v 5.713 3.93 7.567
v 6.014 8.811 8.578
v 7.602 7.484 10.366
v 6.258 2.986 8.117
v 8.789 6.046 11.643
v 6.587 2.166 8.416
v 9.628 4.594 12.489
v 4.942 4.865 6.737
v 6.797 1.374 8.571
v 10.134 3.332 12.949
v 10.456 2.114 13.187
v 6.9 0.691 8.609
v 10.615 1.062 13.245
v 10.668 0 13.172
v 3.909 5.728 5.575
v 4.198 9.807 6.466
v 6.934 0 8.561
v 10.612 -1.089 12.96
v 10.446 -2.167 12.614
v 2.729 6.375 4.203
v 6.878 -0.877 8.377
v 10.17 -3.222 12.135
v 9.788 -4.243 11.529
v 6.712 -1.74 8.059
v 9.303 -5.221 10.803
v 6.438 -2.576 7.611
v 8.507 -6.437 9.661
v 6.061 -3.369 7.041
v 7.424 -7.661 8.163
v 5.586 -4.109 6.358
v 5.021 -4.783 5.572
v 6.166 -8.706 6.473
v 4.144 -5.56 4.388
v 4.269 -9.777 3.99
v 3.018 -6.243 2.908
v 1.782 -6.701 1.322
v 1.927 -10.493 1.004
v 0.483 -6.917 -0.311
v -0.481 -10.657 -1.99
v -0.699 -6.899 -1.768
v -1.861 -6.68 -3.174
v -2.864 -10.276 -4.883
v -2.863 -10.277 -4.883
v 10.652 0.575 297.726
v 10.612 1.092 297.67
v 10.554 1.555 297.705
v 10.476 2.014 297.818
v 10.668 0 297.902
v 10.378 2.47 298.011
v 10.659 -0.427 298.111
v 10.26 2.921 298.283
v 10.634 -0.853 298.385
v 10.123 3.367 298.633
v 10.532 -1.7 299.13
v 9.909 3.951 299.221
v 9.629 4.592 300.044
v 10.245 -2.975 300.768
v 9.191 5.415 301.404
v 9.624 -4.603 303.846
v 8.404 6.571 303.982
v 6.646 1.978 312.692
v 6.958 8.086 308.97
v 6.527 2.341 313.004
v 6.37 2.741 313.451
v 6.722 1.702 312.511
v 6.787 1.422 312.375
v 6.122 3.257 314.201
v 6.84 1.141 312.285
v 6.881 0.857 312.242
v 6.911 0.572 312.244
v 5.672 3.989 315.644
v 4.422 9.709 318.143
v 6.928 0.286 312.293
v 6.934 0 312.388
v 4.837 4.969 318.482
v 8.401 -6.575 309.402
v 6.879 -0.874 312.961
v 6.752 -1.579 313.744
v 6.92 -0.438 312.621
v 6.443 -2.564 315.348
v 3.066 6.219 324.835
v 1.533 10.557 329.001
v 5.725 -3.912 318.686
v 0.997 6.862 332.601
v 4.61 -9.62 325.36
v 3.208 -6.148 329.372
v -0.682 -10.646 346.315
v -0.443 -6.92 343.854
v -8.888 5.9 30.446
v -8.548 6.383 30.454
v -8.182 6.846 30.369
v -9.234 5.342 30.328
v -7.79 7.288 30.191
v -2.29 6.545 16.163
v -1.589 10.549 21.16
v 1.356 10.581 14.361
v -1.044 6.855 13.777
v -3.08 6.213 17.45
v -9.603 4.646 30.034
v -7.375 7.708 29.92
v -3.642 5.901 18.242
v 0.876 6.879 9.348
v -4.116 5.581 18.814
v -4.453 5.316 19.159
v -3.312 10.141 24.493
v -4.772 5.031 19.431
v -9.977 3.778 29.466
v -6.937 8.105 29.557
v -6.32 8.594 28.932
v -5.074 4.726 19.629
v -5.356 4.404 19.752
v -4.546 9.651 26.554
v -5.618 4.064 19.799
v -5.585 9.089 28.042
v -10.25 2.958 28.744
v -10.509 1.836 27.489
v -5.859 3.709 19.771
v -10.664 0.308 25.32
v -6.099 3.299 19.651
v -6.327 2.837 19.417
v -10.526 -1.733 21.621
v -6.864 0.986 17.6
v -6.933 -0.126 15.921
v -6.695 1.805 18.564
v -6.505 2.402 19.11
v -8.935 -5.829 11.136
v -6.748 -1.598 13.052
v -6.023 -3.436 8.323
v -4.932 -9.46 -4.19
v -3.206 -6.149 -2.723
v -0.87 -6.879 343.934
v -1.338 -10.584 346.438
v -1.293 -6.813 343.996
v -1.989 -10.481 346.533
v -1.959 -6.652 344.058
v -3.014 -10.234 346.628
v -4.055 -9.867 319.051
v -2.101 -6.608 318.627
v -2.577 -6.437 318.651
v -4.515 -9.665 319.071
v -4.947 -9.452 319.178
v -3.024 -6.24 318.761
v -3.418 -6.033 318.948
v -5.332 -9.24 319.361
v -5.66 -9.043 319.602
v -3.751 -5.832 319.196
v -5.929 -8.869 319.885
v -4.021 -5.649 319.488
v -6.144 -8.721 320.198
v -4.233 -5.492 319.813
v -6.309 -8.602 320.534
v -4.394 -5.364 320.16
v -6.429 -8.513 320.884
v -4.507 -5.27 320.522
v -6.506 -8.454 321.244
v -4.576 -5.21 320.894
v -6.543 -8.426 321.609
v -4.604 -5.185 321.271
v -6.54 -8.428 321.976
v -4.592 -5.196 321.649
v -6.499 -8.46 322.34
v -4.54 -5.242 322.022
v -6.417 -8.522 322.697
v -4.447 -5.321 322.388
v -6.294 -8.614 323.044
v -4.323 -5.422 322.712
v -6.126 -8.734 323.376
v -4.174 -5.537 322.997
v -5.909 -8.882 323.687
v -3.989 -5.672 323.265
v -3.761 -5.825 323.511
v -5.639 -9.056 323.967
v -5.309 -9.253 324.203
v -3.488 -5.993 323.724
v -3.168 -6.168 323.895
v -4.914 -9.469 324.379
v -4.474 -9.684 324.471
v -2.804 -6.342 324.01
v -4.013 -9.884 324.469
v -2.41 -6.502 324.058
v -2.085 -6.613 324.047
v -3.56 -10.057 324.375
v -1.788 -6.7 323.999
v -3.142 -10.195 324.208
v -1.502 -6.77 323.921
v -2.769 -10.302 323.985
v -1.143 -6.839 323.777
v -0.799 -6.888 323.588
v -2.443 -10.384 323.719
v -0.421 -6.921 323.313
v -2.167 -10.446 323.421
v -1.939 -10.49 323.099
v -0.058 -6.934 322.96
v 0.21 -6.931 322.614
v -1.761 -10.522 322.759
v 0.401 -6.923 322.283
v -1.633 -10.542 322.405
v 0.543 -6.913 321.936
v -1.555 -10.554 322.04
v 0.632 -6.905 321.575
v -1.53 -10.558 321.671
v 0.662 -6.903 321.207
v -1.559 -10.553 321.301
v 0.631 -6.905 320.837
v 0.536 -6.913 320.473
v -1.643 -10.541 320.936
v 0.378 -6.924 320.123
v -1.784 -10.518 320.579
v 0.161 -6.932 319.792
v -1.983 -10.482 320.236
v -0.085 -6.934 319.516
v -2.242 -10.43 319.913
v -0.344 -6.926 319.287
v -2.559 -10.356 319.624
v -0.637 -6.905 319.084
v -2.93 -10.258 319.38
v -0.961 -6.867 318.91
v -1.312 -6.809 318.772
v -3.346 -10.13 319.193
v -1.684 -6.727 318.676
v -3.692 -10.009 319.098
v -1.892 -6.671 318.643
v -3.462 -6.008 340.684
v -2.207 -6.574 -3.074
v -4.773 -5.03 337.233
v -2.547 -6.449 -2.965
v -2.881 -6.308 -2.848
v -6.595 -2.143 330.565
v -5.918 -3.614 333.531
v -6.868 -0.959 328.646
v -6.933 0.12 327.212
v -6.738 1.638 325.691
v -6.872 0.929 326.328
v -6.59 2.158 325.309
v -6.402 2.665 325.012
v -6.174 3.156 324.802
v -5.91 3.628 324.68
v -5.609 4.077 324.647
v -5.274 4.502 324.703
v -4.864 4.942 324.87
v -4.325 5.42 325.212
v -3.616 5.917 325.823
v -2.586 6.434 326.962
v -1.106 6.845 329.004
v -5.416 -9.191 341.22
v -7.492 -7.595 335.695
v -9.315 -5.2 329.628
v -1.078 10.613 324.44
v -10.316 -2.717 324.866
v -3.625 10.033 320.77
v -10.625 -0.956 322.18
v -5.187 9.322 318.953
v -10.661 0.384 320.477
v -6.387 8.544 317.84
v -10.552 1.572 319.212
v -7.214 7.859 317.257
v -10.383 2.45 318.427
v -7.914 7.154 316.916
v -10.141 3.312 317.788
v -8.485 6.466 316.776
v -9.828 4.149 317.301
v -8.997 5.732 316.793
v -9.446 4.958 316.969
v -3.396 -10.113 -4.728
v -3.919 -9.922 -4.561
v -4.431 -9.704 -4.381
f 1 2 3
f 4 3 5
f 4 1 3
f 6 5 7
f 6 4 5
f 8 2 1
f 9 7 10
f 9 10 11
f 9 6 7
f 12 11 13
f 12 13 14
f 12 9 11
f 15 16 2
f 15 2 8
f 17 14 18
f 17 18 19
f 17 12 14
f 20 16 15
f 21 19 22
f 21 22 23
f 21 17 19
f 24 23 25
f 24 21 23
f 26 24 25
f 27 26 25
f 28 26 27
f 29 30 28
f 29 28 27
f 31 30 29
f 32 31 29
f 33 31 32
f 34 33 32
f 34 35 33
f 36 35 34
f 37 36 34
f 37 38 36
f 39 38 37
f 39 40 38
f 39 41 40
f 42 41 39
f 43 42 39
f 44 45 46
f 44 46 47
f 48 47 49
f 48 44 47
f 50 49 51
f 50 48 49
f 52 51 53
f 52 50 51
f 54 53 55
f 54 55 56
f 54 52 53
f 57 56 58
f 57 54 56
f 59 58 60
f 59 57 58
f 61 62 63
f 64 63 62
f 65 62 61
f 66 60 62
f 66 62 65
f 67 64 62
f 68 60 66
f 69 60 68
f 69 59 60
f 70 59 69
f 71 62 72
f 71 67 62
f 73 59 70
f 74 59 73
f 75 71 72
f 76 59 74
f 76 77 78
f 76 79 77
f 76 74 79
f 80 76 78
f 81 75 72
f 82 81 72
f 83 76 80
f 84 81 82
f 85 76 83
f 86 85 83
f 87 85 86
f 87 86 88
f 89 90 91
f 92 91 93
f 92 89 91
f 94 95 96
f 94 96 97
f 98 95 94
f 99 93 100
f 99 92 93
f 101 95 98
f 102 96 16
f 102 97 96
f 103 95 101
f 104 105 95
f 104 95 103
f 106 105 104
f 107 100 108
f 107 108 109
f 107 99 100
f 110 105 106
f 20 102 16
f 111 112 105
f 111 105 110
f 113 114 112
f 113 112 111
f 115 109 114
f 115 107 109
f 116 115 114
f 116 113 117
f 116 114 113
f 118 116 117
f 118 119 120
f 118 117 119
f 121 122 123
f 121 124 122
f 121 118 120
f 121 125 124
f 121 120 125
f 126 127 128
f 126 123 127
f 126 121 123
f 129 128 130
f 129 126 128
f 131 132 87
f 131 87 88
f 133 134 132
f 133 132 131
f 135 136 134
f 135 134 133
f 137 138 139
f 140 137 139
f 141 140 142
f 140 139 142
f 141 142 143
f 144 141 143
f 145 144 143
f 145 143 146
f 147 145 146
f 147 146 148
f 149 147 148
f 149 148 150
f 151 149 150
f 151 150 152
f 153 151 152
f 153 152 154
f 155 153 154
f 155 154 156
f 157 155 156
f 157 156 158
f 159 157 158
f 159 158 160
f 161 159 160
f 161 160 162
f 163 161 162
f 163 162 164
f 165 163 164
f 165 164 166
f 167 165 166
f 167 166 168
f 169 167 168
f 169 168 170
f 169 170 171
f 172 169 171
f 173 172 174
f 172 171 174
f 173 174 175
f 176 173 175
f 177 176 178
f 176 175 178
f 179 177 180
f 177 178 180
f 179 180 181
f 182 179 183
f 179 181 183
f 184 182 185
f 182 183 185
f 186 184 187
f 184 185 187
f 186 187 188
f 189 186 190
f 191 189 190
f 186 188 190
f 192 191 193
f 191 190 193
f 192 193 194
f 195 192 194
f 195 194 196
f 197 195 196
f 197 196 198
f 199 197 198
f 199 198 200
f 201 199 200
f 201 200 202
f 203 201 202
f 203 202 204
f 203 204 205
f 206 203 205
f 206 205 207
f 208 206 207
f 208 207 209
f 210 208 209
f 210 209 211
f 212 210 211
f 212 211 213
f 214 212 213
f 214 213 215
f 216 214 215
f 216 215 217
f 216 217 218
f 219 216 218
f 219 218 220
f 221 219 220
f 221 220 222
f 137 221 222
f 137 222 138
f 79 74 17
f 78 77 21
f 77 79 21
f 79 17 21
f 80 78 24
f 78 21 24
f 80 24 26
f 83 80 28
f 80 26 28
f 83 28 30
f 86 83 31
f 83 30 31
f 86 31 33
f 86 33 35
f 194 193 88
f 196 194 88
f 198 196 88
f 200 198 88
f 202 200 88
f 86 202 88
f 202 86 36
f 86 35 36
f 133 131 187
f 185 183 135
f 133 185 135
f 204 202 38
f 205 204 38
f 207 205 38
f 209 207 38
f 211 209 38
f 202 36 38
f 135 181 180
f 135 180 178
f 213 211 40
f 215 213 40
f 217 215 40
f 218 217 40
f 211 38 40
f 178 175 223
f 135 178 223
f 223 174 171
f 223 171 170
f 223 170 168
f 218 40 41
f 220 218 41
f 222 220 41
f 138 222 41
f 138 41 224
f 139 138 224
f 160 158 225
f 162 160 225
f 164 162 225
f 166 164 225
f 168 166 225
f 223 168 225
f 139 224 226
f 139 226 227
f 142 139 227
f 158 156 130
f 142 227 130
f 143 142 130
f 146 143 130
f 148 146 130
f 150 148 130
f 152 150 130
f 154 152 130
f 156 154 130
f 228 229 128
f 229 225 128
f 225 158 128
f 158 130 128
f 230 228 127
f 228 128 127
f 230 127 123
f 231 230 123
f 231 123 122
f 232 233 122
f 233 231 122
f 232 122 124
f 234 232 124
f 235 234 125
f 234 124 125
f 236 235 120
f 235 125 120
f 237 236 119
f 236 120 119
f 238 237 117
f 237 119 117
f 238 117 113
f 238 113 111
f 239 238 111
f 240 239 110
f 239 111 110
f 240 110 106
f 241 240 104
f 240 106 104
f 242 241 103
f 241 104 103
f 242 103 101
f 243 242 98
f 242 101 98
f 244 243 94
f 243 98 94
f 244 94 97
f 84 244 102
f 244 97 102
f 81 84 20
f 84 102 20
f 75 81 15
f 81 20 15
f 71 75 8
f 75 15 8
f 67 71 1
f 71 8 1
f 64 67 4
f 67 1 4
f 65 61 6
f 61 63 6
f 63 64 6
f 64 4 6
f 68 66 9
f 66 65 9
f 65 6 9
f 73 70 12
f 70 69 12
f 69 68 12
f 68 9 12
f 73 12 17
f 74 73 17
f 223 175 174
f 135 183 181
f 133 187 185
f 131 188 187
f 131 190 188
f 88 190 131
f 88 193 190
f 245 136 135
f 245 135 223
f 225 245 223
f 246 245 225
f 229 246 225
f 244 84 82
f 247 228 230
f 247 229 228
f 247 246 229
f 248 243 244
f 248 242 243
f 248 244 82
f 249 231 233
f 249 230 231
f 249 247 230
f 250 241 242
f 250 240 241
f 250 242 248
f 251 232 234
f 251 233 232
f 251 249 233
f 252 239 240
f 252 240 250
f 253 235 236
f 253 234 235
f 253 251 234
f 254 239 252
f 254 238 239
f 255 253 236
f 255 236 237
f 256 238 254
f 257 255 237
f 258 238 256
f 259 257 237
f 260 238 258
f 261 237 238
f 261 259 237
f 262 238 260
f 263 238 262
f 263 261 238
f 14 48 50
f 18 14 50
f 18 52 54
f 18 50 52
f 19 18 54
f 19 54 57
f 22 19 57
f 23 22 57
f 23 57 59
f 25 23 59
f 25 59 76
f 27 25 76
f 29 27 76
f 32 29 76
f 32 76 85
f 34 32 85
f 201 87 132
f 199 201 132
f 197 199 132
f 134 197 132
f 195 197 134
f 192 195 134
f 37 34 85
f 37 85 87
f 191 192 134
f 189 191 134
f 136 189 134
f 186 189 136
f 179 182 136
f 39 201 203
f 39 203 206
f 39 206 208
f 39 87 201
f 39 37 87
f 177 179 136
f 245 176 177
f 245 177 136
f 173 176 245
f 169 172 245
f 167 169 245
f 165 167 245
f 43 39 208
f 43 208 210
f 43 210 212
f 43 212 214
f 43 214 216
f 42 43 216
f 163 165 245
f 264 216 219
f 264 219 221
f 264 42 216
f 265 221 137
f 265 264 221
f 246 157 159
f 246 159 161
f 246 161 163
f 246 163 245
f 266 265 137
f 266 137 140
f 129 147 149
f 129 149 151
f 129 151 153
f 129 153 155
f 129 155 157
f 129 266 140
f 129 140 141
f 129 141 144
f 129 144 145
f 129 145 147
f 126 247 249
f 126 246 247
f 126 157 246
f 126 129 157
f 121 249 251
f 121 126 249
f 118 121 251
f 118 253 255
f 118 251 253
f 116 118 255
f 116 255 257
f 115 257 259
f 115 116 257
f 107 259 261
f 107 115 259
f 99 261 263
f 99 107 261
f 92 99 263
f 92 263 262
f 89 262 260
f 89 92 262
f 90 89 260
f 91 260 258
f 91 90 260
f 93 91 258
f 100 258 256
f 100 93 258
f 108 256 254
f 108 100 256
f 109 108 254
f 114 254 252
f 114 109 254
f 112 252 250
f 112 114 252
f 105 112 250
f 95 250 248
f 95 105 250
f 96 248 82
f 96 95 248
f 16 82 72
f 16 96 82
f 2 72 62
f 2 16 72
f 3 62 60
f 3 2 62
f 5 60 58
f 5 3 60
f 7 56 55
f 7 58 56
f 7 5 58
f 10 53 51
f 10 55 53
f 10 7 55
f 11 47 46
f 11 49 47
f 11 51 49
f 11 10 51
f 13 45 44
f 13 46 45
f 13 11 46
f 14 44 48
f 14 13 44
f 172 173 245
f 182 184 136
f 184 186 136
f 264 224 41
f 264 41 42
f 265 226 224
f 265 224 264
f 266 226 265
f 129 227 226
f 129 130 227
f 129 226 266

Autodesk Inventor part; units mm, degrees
ref_plane "Start Plane" through (0, 0, -4.8828) normal (0, 0, 1) x (1, 0, 0)
ref_plane "End Plane" through (0, 0, 346.6281) normal (0, 0, 1) x (1, 0, 0)
sketch "Sketch" plane through (0, 0, 0) normal (0, 0, 1) x (1, 0, 0)
  circle A0 centre (0, 0) radius 6.9342
  circle A1 centre (0, 0) radius 10.668
  dimension "d0" = 21.336
  dimension "d1" = 3.7338
extrude "Body" add sketch "Sketch" along normal up to surface (351.5109 mm away) from surface at -4.8828
sketch "Sketch3" plane through (0, 0, 0) normal (0, 0, 1) x (1, 0, 0)
  line L0 (0, 0) -> (10, 0)
ref_plane "Work Plane3" through (0, 0, 0) normal (0, -1, 0) x (1, 0, 0)
sketch "Sketch4" plane through (0, 0, 0) normal (0, -1, 0) x (1, 0, 0)
  line L0 (-2, -4.8828) -> (12, -4.8828)
  line L1 (-2, 346.6281) -> (12, 346.6281)
  dimension "d7" = 351.5109
ref_plane "Work Plane4" through (8.6921, -6.185, 361.8082) normal (-0.7364, 0.524, 0.4281) x (0.6203, 0.2702, 0.7364)
split "Split1" plane through (8.6921, -6.185, 361.8082) removes the side toward (-0.7364, 0.524, 0.4281)
ref_plane "Work Plane5" through (-3.8378, -9.9538, 346.6526) normal (0.2044, 0.5302, 0.8228) x (0.9771, -0.0595, -0.2044)
split "Split2" plane through (-3.8378, -9.9538, 346.6526) removes the side toward (0.2044, 0.5302, 0.8228)
ref_plane "Work Plane6" through (-10.6086, -1.1246, 380.9088) normal (0.9633, 0.1021, 0.2483) x (0.2566, -0.0788, -0.9633)
split "Split3" plane through (-10.6086, -1.1246, 380.9088) removes the side toward (0.9633, 0.1021, 0.2483)
ref_plane "Work Plane7" through (8.6921, -6.185, -30.4674) normal (-0.769, 0.5472, -0.3305) x (0.1167, 0.6285, 0.769)
split "Split4" plane through (8.6921, -6.185, -30.4674) removes the side toward (-0.769, 0.5472, -0.3305)
ref_plane "Work Plane8" through (-10.6086, -1.1246, -13.2489) normal (0.7745, 0.0821, -0.6272) x (-0.6091, -0.1706, -0.7745)
split "Split5" plane through (-10.6086, -1.1246, -13.2489) removes the side toward (0.7745, 0.0821, -0.6272)
ref_plane "Work Plane9" through (2.6801, -10.3259, -5.6452) normal (-0.1175, 0.4527, -0.8839) x (0.8811, 0.4581, 0.1175)
split "Split6" plane through (2.6801, -10.3259, -5.6452) removes the side toward (-0.1175, 0.4527, -0.8839)
ref_plane "Work Plane10" through (-46.7913, -3.422, 233.5882) normal (-0.5112, -0.8523, 0.111) x (0.8583, -0.5129, 0.0149)
sketch "Sketch5" plane through (-46.7913, -3.422, 233.5882) normal (-0.5112, -0.8523, 0.111) x (0.8583, -0.5129, 0.0149)
  circle A0 centre (41.1209, 88.8492) radius 4 projected
  point P0 (34.9285, -229.6953)
hole "Hole1" at (-7.5645, -15.3691, 322.4906) direction (0.5112, 0.8523, -0.111) diameter 5.4 depth 20 tip angle 118
equation "\"d0\" = G_H"
equation "\"d1\" = G_T"
equation "\"d2\" = G_L"
equation "\"G_H\" = 21.336"
equation "\"G_T\" = 3.7338"
equation "\"G_L\" = 351.51086"
equation "\"G_OFFSET_START\" = 4.88279"
equation "\"G_OFFSET_END\" = 7.34335"
equation "\"d4\" = -G_OFFSET_START"
equation "\"d5\" = G_OFFSET_END + B_L"
equation "\"B_L\" = 339.28473"
properties part number "ANSI - 1/2 x 0.147 - 13.839" material "Steel, Mild"
